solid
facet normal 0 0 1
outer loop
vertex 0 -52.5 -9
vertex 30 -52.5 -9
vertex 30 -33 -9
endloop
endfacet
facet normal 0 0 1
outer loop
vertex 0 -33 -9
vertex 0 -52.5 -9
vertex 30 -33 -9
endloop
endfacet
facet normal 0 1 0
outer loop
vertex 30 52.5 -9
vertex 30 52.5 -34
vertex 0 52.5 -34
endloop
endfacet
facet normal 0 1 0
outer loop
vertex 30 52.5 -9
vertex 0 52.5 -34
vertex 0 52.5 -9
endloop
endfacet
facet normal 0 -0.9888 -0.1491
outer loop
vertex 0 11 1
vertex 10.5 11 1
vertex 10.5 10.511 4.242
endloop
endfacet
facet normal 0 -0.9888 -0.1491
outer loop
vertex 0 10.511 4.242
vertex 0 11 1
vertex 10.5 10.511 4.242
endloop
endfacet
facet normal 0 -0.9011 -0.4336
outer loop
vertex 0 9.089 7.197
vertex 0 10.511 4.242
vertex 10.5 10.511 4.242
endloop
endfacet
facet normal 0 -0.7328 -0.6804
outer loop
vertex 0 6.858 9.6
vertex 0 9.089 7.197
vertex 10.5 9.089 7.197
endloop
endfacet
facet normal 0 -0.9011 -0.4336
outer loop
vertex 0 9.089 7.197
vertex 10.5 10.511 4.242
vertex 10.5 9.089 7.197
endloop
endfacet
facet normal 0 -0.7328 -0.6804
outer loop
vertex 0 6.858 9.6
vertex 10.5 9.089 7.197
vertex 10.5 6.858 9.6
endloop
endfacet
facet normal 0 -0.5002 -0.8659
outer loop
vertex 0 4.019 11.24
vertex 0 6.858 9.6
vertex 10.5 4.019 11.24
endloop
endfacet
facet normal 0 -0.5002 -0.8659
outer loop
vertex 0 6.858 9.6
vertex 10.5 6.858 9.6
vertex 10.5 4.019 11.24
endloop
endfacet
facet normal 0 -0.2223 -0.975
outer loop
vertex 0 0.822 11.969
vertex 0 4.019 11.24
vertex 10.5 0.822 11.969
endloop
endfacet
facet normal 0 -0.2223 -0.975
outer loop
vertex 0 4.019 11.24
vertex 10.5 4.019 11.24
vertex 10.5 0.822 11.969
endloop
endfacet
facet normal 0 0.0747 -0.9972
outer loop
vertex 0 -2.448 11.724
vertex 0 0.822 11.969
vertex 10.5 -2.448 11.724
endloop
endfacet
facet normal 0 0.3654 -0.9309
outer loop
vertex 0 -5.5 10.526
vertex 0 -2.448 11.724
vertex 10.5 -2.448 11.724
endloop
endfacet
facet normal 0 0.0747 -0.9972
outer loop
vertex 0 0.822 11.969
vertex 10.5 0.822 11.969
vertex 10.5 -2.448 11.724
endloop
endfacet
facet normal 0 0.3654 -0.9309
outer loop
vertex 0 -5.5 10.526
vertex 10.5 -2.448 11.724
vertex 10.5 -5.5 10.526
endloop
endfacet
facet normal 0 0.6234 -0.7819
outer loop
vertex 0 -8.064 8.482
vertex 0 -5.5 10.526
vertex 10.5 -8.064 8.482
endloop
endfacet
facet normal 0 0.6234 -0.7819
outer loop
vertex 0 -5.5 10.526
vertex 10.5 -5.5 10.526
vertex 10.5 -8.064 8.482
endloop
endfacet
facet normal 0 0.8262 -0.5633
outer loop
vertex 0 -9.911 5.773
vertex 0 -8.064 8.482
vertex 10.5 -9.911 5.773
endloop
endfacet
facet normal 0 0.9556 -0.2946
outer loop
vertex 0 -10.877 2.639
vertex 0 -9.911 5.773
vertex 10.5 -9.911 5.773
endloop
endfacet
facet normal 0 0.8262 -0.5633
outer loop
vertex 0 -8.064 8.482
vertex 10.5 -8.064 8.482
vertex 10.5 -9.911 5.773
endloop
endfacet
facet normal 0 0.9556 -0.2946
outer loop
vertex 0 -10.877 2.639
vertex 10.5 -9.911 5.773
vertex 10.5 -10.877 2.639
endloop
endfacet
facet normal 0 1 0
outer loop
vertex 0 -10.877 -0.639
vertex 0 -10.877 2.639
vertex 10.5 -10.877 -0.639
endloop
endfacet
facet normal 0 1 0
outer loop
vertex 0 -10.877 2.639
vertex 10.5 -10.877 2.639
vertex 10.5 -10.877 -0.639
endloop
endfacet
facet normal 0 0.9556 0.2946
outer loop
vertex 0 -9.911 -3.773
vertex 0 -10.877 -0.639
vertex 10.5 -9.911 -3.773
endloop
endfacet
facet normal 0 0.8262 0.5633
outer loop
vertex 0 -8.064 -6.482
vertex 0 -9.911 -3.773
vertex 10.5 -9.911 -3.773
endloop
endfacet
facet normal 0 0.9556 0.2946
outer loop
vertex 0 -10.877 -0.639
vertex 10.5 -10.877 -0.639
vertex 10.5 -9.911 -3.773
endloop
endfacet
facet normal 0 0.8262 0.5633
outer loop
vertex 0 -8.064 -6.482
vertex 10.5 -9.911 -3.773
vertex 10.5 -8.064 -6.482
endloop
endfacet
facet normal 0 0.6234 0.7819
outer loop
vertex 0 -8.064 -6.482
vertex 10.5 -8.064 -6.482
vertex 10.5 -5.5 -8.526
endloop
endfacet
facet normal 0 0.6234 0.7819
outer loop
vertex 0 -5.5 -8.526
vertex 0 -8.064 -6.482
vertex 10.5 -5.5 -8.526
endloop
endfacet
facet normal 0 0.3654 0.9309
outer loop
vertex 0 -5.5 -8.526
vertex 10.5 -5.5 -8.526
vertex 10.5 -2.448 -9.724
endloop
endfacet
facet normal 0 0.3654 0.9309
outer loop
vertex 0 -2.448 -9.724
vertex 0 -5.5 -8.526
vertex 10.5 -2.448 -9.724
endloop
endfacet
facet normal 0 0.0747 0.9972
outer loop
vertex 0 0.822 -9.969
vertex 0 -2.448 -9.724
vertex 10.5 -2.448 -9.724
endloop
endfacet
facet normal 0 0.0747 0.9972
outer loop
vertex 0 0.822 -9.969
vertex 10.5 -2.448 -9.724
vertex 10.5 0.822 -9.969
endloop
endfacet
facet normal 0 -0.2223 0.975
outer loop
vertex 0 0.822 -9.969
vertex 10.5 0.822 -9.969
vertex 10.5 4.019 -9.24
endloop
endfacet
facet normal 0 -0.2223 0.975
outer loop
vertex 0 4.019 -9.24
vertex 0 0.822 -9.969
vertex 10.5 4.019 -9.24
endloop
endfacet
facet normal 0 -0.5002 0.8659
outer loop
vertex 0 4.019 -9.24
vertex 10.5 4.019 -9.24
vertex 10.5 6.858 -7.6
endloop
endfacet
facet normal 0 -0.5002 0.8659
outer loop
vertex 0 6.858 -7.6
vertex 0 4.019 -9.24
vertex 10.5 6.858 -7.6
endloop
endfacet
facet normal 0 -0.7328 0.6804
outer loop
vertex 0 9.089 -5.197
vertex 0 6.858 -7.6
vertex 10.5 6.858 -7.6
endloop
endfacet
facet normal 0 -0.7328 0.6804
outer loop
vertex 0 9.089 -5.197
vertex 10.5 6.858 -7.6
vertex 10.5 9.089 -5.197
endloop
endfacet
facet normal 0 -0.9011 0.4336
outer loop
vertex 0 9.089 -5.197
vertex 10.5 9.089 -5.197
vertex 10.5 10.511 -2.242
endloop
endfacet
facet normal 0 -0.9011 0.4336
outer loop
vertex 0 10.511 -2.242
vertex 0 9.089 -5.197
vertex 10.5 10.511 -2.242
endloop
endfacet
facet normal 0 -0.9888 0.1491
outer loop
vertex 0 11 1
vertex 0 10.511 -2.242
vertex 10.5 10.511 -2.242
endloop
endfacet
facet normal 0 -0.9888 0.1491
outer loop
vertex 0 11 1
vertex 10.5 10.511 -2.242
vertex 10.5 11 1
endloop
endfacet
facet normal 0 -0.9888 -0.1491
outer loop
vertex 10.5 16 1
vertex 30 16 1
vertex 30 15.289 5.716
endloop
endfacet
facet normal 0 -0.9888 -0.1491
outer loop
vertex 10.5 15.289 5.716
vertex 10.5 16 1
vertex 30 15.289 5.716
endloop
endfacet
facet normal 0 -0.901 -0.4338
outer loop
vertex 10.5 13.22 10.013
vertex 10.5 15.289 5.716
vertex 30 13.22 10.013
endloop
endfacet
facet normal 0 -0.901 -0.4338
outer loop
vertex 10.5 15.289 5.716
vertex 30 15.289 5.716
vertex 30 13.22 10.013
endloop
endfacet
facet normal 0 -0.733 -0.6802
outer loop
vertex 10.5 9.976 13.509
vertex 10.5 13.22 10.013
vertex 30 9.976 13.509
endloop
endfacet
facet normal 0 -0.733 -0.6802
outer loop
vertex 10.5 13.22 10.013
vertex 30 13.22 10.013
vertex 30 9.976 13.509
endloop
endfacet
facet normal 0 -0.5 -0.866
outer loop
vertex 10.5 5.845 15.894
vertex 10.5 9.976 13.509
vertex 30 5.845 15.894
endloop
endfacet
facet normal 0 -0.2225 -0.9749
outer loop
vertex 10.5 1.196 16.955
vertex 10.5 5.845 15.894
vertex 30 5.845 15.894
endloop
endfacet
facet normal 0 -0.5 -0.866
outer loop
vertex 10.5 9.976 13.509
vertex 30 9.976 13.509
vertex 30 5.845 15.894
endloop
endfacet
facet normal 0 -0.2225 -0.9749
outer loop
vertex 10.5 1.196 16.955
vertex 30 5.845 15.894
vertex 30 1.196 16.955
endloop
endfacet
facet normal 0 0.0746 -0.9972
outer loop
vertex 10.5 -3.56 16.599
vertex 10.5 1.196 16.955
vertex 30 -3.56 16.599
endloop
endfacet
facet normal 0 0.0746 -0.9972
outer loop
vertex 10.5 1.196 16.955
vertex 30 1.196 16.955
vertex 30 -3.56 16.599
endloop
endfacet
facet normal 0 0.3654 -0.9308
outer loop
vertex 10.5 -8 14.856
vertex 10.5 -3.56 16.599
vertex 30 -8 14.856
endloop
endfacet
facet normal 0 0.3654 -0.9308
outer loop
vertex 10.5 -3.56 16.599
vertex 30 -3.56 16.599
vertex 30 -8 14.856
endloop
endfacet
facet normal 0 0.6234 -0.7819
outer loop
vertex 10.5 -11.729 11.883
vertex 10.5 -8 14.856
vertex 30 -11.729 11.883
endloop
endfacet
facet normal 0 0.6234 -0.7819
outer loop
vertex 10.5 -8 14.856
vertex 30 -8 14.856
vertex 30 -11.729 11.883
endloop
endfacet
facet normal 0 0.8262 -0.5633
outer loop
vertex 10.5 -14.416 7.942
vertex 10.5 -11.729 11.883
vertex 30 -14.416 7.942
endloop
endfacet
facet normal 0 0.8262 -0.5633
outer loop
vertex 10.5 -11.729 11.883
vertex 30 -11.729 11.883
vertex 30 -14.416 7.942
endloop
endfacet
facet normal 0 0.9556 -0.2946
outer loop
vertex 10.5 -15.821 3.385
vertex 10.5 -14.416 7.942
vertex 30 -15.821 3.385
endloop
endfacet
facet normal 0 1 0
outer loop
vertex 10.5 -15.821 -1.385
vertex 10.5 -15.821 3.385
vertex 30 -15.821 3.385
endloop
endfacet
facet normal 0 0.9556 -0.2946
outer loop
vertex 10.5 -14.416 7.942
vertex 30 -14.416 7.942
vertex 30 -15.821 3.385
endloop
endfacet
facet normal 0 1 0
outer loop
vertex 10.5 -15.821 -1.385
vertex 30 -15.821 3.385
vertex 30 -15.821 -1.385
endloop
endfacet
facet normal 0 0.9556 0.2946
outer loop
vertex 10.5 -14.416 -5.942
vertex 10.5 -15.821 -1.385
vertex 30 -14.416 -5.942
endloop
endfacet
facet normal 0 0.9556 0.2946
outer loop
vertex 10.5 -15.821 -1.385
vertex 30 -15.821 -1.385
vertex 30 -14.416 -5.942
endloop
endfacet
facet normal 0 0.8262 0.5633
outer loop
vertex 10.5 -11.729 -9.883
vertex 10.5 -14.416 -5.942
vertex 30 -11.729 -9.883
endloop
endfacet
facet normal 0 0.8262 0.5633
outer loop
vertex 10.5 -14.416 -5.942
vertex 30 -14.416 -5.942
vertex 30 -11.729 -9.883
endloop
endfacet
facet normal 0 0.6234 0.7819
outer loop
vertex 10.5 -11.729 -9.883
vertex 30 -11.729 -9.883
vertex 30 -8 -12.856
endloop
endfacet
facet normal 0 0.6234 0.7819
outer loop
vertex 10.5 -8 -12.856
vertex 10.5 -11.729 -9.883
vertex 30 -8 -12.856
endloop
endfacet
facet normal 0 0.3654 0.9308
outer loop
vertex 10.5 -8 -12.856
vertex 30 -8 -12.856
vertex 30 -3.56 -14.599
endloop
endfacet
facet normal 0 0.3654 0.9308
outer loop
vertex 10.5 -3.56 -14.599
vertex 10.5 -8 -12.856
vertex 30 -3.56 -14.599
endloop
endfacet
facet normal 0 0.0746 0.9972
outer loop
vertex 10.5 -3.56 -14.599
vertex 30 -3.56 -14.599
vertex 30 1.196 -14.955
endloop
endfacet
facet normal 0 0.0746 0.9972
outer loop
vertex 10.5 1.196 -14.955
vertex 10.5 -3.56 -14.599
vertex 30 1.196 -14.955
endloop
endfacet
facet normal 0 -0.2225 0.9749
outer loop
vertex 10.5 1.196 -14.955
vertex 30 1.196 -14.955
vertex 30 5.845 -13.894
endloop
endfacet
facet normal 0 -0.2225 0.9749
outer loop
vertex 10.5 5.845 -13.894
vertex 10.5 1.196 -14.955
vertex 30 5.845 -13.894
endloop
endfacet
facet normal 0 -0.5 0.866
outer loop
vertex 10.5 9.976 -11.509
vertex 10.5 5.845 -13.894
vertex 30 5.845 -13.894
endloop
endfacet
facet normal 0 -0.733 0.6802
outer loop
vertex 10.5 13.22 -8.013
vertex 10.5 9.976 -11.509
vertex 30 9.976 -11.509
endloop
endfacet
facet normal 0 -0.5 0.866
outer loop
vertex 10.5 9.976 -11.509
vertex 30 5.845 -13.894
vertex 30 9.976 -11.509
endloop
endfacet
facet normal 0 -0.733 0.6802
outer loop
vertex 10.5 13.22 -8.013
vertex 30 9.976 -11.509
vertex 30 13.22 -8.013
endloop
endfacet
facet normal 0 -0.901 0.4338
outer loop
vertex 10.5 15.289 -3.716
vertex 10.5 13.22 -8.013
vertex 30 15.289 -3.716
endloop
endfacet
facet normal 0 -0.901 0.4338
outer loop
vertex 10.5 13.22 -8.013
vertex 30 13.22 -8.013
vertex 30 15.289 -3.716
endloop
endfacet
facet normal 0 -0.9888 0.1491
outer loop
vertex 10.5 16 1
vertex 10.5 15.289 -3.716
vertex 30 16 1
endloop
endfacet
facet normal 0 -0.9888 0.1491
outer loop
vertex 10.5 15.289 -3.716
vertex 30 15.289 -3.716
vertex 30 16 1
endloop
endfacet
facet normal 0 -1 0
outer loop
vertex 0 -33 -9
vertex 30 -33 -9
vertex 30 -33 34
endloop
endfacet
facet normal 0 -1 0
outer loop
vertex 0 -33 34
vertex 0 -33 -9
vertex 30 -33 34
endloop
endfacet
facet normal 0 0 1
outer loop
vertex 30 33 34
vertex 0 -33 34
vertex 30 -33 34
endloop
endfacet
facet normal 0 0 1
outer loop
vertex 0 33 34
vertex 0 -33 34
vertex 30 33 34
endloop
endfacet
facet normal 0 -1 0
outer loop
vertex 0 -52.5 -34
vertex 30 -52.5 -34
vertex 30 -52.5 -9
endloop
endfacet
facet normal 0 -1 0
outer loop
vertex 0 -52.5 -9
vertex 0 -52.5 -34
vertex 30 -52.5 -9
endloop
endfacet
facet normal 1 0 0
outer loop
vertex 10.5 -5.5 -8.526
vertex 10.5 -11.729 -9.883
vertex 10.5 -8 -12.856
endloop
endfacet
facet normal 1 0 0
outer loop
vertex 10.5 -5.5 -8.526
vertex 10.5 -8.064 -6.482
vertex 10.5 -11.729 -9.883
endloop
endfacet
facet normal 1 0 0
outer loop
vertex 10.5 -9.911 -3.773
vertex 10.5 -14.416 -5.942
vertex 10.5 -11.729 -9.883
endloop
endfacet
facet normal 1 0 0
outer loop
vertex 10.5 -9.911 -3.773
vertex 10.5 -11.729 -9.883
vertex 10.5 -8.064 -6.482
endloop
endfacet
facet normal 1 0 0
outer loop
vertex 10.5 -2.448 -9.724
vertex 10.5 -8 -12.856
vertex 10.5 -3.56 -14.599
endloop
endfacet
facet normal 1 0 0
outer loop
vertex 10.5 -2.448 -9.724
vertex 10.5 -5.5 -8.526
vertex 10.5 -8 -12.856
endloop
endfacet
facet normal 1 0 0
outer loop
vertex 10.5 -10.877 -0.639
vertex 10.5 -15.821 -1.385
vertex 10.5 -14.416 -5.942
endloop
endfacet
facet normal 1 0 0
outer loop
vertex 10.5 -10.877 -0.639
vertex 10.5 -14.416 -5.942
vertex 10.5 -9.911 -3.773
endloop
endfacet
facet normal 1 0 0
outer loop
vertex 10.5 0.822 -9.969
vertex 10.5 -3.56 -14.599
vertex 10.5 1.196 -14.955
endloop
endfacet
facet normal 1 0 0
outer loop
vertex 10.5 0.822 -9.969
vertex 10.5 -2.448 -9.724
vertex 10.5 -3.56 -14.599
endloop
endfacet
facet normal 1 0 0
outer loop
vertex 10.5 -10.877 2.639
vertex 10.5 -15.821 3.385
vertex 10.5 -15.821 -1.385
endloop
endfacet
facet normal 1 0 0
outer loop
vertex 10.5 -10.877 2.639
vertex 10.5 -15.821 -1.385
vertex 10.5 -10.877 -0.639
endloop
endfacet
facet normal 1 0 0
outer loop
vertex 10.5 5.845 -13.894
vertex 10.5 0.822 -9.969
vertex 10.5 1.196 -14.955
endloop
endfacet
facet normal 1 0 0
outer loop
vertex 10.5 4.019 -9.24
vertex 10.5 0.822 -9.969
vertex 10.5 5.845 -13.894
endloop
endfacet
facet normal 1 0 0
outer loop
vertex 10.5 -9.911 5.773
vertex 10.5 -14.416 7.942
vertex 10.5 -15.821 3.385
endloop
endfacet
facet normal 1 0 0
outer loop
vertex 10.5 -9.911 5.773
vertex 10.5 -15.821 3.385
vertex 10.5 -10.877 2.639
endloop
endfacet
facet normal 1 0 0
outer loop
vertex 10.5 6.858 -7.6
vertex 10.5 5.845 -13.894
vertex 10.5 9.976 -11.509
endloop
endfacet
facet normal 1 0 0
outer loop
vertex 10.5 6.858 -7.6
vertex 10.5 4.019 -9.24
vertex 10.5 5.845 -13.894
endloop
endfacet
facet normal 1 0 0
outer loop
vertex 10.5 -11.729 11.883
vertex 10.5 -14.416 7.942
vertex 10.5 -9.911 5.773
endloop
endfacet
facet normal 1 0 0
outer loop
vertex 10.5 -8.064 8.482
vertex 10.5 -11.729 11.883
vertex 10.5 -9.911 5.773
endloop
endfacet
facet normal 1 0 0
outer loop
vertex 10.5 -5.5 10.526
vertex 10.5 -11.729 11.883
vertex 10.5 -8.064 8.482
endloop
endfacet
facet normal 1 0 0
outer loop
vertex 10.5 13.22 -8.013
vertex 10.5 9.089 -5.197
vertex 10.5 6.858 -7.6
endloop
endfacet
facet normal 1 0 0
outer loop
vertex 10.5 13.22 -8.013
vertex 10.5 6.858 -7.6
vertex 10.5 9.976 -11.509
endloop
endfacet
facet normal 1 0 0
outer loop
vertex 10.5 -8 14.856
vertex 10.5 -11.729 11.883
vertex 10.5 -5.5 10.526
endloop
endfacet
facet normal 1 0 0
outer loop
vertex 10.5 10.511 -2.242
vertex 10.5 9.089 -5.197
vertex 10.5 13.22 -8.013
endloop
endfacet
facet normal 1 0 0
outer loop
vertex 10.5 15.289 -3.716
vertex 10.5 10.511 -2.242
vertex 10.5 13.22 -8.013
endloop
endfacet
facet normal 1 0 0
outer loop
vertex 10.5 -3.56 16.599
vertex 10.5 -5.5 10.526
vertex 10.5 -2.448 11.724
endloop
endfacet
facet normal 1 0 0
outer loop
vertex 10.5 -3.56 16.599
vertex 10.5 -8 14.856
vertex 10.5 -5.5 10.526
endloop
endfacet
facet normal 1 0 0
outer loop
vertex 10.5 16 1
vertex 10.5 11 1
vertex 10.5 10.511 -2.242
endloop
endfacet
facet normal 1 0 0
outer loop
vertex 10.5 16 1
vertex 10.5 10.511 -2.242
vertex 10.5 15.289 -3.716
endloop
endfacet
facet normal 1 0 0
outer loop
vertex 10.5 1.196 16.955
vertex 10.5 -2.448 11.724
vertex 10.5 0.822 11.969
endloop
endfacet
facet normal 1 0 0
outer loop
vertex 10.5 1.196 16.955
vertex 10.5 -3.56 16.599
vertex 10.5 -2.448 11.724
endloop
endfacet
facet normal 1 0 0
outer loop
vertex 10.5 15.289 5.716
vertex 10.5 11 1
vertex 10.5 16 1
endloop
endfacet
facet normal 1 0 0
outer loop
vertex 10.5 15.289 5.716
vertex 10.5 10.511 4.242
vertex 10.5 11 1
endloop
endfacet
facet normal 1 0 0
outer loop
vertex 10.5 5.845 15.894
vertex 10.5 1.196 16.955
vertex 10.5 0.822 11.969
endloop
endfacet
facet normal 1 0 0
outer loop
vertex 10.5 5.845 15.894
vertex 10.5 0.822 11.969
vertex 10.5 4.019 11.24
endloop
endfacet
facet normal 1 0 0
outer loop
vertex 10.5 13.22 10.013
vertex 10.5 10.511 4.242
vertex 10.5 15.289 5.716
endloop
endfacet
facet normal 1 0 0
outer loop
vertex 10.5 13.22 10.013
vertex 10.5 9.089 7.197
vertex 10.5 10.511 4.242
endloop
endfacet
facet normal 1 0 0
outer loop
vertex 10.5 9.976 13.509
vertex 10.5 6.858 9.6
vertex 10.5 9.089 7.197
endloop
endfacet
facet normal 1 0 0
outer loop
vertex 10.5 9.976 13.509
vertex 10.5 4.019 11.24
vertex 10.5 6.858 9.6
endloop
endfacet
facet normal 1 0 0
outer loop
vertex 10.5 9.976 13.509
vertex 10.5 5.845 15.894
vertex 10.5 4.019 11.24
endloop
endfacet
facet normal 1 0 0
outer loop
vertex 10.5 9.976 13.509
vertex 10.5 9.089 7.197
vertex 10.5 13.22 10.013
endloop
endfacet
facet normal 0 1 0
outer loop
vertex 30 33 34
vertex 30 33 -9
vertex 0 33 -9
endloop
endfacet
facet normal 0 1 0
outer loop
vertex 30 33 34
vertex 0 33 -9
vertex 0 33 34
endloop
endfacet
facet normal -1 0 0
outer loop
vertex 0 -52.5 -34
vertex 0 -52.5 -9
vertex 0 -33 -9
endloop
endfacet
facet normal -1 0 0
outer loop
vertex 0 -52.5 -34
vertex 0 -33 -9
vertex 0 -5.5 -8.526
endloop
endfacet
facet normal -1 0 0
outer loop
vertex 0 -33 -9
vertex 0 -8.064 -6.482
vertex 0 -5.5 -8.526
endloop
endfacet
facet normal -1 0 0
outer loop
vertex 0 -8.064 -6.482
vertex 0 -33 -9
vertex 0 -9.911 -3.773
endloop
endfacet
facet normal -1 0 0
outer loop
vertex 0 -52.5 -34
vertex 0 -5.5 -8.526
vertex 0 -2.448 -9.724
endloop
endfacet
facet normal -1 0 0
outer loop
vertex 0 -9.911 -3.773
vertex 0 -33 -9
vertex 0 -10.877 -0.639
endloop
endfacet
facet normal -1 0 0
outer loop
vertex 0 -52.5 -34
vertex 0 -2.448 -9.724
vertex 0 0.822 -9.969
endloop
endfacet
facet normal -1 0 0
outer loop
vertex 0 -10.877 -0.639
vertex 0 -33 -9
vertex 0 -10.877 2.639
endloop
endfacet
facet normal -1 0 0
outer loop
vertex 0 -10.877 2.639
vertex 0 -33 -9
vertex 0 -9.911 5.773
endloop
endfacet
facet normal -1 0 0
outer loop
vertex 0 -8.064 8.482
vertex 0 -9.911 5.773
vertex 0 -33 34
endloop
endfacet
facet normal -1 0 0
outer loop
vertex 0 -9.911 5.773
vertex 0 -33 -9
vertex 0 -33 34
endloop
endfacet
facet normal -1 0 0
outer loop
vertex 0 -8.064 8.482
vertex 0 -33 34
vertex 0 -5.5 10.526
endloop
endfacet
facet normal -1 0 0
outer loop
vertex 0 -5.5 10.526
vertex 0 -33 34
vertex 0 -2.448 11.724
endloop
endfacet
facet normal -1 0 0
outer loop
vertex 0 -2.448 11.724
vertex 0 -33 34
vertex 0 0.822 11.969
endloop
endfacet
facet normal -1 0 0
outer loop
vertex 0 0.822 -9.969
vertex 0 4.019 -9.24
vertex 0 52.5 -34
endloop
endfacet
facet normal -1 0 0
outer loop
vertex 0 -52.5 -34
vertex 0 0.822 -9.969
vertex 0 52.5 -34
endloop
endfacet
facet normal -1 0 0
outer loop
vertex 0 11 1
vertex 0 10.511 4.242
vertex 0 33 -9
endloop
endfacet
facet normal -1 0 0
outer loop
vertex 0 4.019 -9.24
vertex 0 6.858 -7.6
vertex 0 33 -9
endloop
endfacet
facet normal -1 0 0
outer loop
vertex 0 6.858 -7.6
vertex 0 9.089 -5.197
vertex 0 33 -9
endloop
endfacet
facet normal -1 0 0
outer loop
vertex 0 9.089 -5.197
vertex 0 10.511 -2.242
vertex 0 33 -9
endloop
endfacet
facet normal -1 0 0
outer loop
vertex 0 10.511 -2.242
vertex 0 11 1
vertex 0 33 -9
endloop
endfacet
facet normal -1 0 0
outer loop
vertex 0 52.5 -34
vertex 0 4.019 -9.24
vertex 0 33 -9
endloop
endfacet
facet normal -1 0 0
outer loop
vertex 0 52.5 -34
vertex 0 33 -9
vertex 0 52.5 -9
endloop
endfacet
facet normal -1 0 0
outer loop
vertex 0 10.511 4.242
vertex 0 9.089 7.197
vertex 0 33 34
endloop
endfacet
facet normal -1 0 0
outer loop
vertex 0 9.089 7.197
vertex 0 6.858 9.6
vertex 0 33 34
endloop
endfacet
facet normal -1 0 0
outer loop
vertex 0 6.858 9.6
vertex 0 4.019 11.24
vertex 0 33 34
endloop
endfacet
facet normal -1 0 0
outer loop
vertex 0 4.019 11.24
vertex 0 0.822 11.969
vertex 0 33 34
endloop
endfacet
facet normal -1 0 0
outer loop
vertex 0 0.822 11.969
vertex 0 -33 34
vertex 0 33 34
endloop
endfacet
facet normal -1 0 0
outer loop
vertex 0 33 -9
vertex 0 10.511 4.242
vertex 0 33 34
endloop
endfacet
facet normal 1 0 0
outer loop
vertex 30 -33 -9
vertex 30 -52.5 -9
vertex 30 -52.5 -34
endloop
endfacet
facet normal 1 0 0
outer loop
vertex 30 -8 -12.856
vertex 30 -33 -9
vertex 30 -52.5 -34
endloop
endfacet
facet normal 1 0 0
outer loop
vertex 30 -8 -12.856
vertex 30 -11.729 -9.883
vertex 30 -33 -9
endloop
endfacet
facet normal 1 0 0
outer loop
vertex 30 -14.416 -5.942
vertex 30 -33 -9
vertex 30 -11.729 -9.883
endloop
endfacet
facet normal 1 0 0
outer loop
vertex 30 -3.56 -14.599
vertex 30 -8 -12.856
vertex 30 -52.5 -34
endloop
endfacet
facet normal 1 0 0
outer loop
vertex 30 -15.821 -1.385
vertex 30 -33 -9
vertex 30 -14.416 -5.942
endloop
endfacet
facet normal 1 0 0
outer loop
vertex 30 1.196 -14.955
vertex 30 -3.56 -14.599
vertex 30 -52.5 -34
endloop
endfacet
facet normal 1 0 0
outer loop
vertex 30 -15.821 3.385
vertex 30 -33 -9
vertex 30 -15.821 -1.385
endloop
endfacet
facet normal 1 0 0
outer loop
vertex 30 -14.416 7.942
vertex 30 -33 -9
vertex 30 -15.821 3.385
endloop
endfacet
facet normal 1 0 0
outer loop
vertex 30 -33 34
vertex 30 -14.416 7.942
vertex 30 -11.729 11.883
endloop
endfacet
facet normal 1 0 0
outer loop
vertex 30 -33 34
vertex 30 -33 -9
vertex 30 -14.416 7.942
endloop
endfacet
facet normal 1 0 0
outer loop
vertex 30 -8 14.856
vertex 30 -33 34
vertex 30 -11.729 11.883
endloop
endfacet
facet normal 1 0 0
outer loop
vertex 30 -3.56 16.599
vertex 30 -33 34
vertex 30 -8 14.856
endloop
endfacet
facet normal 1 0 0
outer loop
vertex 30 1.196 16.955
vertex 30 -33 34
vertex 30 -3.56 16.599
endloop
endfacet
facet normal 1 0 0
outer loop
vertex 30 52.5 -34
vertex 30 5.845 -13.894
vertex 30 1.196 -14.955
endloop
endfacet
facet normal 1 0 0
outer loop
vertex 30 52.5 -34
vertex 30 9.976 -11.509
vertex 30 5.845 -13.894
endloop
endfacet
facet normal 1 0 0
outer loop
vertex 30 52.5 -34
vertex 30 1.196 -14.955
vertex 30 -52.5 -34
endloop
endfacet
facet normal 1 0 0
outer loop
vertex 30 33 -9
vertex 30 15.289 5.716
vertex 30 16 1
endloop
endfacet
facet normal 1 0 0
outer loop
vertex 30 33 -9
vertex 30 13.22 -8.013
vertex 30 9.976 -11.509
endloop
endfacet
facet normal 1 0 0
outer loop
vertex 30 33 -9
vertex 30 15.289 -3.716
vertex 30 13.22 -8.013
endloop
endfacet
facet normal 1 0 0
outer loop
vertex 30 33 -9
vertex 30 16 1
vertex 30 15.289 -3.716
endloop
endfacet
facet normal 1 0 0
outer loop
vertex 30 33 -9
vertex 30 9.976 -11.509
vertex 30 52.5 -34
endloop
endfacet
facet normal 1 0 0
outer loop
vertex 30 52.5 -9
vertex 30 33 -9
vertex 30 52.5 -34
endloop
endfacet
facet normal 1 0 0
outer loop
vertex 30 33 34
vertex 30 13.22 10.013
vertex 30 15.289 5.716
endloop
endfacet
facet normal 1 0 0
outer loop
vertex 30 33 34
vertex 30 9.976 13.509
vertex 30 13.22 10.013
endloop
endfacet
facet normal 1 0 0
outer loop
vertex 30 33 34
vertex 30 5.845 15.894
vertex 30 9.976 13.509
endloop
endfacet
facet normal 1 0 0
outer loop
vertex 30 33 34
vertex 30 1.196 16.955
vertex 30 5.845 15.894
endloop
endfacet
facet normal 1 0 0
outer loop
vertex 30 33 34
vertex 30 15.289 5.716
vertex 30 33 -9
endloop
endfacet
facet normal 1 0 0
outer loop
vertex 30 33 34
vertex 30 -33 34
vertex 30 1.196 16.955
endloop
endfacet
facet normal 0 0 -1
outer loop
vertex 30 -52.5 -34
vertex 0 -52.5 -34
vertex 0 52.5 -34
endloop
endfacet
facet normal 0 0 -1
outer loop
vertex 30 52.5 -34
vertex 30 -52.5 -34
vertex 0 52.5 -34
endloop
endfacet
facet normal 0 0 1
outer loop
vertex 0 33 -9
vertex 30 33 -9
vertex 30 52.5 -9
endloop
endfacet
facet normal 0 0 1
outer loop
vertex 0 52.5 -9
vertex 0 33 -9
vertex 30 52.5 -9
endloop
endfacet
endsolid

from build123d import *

# Parameters (mm, degrees)
F0_W      = 105
F0_H      = 68
F1_DEPTH  = 30
F2_W      = 19.5
F2_H      = 43
F3_DEPTH  = 30.001
F4_R      = 16
F4_R_2    = 11
F5_DEPTH  = 19.5
F5_FACE_R = 11
F6_DEPTH  = 30.001


with BuildPart() as f1:
    # F0 (on Right) → F1 (new body)
    with BuildSketch(Plane.YZ):
        Rectangle(F0_W, F0_H)
    extrude(amount=F1_DEPTH)

    # F2 (on face) → F3 (cut, through all)
    with BuildSketch(Plane.YZ.offset(30)):
        with Locations((-42.75, 12.5)):
            Rectangle(F2_W, F2_H)
        with Locations((42.75, 12.5)):
            Rectangle(F2_W, F2_H)
    extrude(amount=-F3_DEPTH, mode=Mode.SUBTRACT)

    # F4 (on face) → F5 (cut)
    with BuildSketch(Plane.YZ.offset(30)):
        with Locations((0, 1)):
            Circle(F4_R)
        with Locations((0, 1)):
            Circle(F4_R_2, mode=Mode.SUBTRACT)
    extrude(amount=-F5_DEPTH, mode=Mode.SUBTRACT)

    # F5_face (on face) → F6 (cut, through all)
    with BuildSketch(Plane(origin=(30, 0, 1), x_dir=(0, 1, 0), z_dir=(1, 0, 0))):
        Circle(F5_FACE_R)
    extrude(amount=-F6_DEPTH, mode=Mode.SUBTRACT)


solid = f1.part
